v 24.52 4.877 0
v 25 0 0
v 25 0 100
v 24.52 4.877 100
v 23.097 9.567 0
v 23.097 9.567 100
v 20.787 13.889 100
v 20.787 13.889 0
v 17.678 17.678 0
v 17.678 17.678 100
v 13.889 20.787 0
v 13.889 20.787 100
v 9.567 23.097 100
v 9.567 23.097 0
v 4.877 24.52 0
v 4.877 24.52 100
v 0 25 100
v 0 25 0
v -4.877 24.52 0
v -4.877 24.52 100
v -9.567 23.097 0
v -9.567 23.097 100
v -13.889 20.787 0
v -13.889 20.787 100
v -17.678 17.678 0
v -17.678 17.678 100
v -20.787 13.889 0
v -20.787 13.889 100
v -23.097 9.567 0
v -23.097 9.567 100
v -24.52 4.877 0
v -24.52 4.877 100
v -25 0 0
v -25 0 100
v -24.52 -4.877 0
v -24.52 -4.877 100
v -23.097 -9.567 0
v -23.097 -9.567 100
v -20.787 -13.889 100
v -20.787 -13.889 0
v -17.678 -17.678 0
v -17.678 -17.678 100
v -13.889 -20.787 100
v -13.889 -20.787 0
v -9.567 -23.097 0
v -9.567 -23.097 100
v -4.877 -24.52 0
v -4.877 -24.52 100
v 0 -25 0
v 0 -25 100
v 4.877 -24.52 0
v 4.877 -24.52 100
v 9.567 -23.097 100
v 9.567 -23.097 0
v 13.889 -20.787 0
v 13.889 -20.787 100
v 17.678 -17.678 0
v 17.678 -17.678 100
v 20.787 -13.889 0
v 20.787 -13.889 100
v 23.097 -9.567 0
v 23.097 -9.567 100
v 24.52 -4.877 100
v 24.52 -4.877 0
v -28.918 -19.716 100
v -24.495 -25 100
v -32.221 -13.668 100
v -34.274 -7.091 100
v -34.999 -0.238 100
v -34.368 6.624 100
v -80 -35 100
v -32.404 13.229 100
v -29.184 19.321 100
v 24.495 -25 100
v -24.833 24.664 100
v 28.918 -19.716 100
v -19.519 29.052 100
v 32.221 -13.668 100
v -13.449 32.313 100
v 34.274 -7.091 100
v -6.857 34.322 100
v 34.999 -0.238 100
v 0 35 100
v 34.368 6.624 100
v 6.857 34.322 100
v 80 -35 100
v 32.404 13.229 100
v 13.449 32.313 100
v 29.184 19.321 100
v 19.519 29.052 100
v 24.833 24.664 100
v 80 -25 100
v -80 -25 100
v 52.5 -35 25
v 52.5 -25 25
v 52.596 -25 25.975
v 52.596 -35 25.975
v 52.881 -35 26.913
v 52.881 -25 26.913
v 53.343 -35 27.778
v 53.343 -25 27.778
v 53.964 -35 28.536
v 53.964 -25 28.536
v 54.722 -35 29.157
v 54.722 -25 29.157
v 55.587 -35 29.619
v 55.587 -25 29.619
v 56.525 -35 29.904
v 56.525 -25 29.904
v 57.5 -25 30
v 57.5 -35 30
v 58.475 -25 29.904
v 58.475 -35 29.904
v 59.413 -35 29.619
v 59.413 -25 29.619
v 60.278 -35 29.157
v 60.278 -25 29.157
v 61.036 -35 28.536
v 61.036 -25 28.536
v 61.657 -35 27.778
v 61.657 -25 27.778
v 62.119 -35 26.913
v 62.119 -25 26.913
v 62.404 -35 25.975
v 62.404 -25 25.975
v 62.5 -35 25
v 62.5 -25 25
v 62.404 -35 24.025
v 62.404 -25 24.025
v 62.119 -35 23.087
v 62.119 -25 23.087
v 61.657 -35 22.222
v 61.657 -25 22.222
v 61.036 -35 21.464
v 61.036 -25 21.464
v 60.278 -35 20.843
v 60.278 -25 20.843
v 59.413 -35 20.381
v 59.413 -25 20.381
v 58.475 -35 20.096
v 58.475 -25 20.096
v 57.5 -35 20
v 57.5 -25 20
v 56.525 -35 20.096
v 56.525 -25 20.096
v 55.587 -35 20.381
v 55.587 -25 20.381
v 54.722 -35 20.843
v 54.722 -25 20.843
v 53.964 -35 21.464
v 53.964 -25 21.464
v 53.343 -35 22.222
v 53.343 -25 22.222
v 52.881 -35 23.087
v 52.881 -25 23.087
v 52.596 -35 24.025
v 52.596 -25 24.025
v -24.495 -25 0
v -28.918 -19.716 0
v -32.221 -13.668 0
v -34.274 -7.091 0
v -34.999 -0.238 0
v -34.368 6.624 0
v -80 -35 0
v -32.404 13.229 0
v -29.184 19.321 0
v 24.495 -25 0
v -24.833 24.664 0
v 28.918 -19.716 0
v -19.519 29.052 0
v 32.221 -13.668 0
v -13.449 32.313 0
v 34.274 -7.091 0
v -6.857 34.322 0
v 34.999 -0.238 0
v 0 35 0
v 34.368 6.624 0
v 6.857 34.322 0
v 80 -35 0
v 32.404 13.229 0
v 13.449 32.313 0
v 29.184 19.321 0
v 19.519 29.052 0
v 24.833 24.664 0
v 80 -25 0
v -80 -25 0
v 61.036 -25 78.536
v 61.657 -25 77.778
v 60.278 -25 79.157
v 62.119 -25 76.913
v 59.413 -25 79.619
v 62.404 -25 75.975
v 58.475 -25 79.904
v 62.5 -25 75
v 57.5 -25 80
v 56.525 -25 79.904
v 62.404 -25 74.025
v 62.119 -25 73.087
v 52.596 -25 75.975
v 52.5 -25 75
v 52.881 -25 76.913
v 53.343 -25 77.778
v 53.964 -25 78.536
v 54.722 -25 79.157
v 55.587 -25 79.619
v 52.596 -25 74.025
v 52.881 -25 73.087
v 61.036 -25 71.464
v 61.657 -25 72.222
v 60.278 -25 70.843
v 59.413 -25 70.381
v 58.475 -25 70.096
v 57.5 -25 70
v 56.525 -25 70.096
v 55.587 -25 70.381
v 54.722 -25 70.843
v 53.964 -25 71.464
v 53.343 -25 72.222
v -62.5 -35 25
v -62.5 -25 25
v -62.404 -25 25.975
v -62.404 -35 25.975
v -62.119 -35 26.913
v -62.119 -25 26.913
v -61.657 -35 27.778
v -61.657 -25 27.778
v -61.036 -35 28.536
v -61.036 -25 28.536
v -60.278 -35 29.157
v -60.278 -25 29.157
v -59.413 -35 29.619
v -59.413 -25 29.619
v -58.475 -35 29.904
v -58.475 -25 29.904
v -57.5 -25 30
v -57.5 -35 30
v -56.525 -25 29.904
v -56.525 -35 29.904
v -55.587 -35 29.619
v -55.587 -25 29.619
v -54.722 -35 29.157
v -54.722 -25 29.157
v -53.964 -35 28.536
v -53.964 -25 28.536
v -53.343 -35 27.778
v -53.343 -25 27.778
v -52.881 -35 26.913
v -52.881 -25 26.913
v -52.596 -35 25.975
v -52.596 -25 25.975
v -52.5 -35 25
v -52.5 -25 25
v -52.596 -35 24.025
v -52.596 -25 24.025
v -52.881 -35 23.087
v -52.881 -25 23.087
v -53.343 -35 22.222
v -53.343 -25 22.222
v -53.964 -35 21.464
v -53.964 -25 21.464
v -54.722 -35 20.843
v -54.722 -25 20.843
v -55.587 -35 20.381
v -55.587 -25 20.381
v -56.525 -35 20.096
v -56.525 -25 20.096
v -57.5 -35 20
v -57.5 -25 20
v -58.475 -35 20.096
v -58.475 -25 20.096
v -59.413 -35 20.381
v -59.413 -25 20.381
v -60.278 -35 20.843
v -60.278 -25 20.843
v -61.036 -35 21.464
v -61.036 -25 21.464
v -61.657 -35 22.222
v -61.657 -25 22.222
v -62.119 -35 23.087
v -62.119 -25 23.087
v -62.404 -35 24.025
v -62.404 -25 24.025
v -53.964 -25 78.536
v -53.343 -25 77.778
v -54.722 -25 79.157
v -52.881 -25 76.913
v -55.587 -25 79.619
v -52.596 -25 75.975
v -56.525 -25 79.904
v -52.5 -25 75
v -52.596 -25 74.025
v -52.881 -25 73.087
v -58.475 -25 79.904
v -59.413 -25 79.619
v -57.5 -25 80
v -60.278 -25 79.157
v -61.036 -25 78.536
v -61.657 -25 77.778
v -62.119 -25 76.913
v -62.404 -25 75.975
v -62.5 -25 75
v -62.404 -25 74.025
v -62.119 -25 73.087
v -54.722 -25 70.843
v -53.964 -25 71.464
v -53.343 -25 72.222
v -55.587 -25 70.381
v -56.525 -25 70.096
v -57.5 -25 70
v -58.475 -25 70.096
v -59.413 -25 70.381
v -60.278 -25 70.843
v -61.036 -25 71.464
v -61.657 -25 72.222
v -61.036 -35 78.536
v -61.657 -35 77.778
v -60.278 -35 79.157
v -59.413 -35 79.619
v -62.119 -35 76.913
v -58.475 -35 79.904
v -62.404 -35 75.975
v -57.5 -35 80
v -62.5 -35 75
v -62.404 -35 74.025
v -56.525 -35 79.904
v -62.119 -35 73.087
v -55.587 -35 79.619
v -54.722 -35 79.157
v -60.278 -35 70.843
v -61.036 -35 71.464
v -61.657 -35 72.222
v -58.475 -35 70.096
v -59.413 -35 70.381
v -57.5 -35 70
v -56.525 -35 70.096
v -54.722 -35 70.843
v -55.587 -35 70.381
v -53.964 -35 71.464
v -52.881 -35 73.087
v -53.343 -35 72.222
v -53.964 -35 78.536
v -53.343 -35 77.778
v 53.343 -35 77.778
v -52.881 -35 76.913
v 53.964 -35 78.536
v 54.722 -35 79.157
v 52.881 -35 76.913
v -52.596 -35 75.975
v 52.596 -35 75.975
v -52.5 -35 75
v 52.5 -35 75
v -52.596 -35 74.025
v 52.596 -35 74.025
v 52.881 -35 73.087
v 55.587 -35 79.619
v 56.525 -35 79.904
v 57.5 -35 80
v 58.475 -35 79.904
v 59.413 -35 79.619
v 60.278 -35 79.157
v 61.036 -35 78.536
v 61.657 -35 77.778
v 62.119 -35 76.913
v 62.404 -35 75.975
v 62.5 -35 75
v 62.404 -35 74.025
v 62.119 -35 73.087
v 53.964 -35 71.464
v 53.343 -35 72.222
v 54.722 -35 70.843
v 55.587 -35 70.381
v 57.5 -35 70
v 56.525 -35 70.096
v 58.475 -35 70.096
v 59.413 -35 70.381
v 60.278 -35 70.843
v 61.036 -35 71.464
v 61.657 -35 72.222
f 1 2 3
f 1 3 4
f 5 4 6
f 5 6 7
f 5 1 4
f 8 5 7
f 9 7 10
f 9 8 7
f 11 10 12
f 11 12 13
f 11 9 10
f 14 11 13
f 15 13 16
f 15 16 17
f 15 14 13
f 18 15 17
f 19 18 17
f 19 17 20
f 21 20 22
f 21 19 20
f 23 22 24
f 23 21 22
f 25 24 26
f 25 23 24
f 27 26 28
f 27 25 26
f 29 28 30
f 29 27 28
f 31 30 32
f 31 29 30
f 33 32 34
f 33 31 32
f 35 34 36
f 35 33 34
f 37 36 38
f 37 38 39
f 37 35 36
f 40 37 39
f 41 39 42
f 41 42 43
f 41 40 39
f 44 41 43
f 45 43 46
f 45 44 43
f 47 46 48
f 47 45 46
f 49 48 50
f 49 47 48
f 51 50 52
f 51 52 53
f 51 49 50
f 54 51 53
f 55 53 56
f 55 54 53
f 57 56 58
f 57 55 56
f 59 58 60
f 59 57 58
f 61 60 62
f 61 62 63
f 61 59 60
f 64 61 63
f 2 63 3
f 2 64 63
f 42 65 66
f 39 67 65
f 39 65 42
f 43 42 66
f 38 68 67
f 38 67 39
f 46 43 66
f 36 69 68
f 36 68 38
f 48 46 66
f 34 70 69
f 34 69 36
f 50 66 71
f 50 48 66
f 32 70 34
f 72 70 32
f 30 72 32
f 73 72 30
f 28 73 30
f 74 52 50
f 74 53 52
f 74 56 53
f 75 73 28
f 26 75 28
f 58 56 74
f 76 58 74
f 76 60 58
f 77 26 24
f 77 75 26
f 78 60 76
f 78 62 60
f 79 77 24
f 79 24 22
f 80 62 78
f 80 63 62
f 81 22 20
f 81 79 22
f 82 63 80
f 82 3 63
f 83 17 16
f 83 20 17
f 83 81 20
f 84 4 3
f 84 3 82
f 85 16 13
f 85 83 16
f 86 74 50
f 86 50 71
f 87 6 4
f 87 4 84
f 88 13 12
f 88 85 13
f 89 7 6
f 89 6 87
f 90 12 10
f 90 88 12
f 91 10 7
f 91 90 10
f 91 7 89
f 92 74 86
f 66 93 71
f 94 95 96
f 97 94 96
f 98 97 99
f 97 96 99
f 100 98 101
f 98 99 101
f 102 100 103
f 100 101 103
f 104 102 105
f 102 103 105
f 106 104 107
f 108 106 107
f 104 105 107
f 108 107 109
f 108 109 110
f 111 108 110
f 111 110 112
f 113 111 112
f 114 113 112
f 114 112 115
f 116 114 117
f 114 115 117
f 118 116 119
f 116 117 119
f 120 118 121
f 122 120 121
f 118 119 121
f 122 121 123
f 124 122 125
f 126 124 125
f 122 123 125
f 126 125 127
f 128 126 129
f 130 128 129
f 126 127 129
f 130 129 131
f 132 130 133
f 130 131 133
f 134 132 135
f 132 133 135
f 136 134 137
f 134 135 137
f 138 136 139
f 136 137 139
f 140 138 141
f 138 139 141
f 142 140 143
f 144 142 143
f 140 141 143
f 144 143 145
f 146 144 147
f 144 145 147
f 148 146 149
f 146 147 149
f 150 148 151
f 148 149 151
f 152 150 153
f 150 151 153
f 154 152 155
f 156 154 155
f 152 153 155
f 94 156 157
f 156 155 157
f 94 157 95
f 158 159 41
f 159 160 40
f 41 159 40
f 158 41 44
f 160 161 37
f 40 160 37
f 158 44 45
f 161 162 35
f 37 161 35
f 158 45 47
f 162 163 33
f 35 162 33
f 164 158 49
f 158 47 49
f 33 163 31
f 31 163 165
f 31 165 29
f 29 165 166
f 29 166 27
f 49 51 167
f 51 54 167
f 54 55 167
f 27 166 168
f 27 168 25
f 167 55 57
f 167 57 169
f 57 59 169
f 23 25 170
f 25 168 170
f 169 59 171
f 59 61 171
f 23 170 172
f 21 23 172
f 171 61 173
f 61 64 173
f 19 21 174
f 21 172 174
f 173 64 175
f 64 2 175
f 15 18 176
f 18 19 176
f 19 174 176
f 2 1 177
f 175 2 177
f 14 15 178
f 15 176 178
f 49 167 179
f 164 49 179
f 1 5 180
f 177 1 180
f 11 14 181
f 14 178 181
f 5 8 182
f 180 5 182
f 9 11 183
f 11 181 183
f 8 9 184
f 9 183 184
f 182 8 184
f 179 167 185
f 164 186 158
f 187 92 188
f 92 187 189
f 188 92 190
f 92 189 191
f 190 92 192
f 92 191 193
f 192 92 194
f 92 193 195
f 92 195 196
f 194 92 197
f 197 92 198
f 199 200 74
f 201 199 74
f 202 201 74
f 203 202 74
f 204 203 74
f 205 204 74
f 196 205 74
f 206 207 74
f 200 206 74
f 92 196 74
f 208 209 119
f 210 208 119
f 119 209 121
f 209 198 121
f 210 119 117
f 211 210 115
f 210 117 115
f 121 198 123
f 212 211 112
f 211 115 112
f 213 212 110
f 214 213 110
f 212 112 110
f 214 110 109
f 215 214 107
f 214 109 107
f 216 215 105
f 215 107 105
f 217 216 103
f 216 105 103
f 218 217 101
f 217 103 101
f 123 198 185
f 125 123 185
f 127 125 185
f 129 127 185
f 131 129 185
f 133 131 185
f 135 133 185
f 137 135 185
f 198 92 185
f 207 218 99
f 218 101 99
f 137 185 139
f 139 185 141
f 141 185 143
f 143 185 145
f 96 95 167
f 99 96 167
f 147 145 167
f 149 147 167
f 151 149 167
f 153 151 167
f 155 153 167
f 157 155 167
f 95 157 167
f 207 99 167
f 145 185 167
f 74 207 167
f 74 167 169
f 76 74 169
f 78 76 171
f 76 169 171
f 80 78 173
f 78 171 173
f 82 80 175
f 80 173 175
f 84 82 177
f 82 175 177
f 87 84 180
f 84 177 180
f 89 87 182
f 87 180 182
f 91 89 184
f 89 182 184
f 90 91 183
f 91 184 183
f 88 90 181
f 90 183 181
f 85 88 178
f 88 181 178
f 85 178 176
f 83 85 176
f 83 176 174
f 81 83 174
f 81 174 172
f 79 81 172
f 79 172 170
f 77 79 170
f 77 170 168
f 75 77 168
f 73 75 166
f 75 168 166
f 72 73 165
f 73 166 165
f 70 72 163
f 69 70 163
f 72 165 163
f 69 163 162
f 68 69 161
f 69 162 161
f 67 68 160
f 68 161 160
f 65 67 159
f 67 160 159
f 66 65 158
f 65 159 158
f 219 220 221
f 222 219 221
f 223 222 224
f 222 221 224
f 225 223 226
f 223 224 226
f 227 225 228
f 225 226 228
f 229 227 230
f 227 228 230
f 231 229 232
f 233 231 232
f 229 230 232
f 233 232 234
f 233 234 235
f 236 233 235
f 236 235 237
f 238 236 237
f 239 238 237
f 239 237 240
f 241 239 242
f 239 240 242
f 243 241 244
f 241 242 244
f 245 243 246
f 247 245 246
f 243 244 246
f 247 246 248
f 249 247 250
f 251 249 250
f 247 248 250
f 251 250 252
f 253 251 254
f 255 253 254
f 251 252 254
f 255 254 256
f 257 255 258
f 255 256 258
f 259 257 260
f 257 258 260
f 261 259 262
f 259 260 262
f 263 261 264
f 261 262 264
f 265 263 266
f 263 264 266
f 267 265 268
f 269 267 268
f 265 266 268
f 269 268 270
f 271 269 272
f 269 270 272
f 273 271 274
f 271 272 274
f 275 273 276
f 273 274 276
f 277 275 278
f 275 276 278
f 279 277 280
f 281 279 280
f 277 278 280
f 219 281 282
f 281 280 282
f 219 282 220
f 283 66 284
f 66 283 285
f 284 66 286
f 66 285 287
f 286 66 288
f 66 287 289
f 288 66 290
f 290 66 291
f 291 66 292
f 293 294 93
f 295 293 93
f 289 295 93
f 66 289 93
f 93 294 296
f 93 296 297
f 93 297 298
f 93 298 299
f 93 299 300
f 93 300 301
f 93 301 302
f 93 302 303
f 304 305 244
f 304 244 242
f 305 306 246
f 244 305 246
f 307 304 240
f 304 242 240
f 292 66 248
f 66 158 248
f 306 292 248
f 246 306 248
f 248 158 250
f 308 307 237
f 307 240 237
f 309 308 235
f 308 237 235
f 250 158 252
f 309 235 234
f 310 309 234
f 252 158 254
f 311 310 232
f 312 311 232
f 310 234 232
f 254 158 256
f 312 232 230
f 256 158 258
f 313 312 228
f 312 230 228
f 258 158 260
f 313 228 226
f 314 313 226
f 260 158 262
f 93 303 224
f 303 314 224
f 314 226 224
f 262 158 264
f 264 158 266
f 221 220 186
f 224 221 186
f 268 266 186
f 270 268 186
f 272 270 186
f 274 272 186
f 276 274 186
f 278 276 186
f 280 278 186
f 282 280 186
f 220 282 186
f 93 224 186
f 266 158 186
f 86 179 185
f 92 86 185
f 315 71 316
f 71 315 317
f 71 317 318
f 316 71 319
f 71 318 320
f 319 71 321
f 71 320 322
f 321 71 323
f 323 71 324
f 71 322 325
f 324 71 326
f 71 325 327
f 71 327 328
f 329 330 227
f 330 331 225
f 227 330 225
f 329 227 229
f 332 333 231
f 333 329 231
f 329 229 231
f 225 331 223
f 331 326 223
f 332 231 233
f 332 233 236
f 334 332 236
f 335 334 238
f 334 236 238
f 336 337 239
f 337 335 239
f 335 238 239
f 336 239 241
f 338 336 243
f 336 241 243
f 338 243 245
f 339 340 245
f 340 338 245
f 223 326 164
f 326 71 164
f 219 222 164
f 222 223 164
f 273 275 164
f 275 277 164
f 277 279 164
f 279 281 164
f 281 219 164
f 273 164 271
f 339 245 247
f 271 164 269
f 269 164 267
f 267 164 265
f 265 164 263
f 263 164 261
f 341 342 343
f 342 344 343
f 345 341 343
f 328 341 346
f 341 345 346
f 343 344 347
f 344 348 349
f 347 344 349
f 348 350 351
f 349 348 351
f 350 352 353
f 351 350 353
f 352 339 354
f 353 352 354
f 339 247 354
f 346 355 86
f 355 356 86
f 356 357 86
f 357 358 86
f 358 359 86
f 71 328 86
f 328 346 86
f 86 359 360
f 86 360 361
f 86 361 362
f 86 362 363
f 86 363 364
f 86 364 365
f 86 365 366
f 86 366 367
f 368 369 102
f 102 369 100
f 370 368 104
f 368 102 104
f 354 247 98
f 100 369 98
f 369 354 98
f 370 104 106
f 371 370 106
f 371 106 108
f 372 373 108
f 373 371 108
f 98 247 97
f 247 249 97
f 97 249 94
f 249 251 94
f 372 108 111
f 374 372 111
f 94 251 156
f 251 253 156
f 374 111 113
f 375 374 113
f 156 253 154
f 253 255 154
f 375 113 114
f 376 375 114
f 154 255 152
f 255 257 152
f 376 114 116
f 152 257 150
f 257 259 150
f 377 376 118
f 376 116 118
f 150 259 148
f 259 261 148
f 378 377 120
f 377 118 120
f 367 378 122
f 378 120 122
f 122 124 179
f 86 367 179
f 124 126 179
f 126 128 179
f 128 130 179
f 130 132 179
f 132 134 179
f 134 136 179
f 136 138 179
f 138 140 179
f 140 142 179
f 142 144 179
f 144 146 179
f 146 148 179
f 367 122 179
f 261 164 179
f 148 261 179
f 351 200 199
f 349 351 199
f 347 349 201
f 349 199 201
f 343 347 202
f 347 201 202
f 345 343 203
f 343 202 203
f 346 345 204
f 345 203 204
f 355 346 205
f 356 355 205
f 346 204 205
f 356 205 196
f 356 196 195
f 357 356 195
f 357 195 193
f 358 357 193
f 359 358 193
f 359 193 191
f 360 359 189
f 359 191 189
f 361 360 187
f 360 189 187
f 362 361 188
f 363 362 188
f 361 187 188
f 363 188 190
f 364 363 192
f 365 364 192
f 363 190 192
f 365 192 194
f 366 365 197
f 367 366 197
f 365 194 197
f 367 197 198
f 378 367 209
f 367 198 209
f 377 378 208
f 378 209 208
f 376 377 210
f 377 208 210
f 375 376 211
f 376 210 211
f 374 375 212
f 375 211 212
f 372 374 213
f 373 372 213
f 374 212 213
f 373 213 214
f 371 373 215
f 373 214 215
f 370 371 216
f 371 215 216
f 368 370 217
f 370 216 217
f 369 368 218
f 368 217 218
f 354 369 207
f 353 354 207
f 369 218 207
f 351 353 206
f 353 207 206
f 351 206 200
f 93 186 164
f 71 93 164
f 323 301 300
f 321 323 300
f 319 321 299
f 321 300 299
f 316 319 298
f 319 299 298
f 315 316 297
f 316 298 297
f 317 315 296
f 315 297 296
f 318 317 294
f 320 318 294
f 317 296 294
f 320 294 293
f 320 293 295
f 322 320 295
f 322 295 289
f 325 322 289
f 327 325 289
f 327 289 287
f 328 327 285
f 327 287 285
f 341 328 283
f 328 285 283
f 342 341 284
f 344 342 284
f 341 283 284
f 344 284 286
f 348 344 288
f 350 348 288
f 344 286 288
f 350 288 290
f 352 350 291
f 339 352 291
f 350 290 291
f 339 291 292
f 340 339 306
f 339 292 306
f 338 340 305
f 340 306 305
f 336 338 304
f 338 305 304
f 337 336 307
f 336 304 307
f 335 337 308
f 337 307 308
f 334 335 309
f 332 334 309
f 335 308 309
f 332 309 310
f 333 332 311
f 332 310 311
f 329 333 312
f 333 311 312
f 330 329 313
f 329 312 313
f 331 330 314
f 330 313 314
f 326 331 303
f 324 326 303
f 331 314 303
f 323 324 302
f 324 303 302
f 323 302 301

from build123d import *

# Parameters (mm, degrees)
SKETCH2_R           = 25
BOSS_EXTRUDE1_DEPTH = 100
SKETCH3_R           = 5
CUT_EXTRUDE1_DEPTH  = 10


with BuildPart() as part:
    # Sketch2 → Boss-Extrude1 (new body)
    with BuildSketch(Plane.XY):
        with BuildLine():
            Line((-80, -35), (80, -35))
            Line((80, -35), (80, -25))
            Line((80, -25), (24.494897428, -25))
            ThreePointArc((24.494897428, -25), (0, 35), (-24.494897428, -25))
            Line((-24.494897428, -25), (-80, -25))
            Line((-80, -25), (-80, -35))
        make_face()
        Circle(SKETCH2_R, mode=Mode.SUBTRACT)
    extrude(amount=BOSS_EXTRUDE1_DEPTH)

    # Sketch3 → Cut-Extrude1 (cut)
    with BuildSketch(Plane(origin=(0, -25, 0), x_dir=(1, 0, 0), z_dir=(0, 1, 0))):
        with Locations(Location((57.5, -25, 0), (0, 0, 180))):
            Circle(SKETCH3_R)
        with Locations(Location((57.5, -75, 0), (0, 0, 180))):
            Circle(SKETCH3_R)
        with Locations(Location((-57.5, -25, 0), (0, 0, 180))):
            Circle(SKETCH3_R)
        with Locations(Location((-57.5, -75, 0), (0, 0, 180))):
            Circle(SKETCH3_R)
    extrude(amount=-CUT_EXTRUDE1_DEPTH, mode=Mode.SUBTRACT)


solid = part.part
